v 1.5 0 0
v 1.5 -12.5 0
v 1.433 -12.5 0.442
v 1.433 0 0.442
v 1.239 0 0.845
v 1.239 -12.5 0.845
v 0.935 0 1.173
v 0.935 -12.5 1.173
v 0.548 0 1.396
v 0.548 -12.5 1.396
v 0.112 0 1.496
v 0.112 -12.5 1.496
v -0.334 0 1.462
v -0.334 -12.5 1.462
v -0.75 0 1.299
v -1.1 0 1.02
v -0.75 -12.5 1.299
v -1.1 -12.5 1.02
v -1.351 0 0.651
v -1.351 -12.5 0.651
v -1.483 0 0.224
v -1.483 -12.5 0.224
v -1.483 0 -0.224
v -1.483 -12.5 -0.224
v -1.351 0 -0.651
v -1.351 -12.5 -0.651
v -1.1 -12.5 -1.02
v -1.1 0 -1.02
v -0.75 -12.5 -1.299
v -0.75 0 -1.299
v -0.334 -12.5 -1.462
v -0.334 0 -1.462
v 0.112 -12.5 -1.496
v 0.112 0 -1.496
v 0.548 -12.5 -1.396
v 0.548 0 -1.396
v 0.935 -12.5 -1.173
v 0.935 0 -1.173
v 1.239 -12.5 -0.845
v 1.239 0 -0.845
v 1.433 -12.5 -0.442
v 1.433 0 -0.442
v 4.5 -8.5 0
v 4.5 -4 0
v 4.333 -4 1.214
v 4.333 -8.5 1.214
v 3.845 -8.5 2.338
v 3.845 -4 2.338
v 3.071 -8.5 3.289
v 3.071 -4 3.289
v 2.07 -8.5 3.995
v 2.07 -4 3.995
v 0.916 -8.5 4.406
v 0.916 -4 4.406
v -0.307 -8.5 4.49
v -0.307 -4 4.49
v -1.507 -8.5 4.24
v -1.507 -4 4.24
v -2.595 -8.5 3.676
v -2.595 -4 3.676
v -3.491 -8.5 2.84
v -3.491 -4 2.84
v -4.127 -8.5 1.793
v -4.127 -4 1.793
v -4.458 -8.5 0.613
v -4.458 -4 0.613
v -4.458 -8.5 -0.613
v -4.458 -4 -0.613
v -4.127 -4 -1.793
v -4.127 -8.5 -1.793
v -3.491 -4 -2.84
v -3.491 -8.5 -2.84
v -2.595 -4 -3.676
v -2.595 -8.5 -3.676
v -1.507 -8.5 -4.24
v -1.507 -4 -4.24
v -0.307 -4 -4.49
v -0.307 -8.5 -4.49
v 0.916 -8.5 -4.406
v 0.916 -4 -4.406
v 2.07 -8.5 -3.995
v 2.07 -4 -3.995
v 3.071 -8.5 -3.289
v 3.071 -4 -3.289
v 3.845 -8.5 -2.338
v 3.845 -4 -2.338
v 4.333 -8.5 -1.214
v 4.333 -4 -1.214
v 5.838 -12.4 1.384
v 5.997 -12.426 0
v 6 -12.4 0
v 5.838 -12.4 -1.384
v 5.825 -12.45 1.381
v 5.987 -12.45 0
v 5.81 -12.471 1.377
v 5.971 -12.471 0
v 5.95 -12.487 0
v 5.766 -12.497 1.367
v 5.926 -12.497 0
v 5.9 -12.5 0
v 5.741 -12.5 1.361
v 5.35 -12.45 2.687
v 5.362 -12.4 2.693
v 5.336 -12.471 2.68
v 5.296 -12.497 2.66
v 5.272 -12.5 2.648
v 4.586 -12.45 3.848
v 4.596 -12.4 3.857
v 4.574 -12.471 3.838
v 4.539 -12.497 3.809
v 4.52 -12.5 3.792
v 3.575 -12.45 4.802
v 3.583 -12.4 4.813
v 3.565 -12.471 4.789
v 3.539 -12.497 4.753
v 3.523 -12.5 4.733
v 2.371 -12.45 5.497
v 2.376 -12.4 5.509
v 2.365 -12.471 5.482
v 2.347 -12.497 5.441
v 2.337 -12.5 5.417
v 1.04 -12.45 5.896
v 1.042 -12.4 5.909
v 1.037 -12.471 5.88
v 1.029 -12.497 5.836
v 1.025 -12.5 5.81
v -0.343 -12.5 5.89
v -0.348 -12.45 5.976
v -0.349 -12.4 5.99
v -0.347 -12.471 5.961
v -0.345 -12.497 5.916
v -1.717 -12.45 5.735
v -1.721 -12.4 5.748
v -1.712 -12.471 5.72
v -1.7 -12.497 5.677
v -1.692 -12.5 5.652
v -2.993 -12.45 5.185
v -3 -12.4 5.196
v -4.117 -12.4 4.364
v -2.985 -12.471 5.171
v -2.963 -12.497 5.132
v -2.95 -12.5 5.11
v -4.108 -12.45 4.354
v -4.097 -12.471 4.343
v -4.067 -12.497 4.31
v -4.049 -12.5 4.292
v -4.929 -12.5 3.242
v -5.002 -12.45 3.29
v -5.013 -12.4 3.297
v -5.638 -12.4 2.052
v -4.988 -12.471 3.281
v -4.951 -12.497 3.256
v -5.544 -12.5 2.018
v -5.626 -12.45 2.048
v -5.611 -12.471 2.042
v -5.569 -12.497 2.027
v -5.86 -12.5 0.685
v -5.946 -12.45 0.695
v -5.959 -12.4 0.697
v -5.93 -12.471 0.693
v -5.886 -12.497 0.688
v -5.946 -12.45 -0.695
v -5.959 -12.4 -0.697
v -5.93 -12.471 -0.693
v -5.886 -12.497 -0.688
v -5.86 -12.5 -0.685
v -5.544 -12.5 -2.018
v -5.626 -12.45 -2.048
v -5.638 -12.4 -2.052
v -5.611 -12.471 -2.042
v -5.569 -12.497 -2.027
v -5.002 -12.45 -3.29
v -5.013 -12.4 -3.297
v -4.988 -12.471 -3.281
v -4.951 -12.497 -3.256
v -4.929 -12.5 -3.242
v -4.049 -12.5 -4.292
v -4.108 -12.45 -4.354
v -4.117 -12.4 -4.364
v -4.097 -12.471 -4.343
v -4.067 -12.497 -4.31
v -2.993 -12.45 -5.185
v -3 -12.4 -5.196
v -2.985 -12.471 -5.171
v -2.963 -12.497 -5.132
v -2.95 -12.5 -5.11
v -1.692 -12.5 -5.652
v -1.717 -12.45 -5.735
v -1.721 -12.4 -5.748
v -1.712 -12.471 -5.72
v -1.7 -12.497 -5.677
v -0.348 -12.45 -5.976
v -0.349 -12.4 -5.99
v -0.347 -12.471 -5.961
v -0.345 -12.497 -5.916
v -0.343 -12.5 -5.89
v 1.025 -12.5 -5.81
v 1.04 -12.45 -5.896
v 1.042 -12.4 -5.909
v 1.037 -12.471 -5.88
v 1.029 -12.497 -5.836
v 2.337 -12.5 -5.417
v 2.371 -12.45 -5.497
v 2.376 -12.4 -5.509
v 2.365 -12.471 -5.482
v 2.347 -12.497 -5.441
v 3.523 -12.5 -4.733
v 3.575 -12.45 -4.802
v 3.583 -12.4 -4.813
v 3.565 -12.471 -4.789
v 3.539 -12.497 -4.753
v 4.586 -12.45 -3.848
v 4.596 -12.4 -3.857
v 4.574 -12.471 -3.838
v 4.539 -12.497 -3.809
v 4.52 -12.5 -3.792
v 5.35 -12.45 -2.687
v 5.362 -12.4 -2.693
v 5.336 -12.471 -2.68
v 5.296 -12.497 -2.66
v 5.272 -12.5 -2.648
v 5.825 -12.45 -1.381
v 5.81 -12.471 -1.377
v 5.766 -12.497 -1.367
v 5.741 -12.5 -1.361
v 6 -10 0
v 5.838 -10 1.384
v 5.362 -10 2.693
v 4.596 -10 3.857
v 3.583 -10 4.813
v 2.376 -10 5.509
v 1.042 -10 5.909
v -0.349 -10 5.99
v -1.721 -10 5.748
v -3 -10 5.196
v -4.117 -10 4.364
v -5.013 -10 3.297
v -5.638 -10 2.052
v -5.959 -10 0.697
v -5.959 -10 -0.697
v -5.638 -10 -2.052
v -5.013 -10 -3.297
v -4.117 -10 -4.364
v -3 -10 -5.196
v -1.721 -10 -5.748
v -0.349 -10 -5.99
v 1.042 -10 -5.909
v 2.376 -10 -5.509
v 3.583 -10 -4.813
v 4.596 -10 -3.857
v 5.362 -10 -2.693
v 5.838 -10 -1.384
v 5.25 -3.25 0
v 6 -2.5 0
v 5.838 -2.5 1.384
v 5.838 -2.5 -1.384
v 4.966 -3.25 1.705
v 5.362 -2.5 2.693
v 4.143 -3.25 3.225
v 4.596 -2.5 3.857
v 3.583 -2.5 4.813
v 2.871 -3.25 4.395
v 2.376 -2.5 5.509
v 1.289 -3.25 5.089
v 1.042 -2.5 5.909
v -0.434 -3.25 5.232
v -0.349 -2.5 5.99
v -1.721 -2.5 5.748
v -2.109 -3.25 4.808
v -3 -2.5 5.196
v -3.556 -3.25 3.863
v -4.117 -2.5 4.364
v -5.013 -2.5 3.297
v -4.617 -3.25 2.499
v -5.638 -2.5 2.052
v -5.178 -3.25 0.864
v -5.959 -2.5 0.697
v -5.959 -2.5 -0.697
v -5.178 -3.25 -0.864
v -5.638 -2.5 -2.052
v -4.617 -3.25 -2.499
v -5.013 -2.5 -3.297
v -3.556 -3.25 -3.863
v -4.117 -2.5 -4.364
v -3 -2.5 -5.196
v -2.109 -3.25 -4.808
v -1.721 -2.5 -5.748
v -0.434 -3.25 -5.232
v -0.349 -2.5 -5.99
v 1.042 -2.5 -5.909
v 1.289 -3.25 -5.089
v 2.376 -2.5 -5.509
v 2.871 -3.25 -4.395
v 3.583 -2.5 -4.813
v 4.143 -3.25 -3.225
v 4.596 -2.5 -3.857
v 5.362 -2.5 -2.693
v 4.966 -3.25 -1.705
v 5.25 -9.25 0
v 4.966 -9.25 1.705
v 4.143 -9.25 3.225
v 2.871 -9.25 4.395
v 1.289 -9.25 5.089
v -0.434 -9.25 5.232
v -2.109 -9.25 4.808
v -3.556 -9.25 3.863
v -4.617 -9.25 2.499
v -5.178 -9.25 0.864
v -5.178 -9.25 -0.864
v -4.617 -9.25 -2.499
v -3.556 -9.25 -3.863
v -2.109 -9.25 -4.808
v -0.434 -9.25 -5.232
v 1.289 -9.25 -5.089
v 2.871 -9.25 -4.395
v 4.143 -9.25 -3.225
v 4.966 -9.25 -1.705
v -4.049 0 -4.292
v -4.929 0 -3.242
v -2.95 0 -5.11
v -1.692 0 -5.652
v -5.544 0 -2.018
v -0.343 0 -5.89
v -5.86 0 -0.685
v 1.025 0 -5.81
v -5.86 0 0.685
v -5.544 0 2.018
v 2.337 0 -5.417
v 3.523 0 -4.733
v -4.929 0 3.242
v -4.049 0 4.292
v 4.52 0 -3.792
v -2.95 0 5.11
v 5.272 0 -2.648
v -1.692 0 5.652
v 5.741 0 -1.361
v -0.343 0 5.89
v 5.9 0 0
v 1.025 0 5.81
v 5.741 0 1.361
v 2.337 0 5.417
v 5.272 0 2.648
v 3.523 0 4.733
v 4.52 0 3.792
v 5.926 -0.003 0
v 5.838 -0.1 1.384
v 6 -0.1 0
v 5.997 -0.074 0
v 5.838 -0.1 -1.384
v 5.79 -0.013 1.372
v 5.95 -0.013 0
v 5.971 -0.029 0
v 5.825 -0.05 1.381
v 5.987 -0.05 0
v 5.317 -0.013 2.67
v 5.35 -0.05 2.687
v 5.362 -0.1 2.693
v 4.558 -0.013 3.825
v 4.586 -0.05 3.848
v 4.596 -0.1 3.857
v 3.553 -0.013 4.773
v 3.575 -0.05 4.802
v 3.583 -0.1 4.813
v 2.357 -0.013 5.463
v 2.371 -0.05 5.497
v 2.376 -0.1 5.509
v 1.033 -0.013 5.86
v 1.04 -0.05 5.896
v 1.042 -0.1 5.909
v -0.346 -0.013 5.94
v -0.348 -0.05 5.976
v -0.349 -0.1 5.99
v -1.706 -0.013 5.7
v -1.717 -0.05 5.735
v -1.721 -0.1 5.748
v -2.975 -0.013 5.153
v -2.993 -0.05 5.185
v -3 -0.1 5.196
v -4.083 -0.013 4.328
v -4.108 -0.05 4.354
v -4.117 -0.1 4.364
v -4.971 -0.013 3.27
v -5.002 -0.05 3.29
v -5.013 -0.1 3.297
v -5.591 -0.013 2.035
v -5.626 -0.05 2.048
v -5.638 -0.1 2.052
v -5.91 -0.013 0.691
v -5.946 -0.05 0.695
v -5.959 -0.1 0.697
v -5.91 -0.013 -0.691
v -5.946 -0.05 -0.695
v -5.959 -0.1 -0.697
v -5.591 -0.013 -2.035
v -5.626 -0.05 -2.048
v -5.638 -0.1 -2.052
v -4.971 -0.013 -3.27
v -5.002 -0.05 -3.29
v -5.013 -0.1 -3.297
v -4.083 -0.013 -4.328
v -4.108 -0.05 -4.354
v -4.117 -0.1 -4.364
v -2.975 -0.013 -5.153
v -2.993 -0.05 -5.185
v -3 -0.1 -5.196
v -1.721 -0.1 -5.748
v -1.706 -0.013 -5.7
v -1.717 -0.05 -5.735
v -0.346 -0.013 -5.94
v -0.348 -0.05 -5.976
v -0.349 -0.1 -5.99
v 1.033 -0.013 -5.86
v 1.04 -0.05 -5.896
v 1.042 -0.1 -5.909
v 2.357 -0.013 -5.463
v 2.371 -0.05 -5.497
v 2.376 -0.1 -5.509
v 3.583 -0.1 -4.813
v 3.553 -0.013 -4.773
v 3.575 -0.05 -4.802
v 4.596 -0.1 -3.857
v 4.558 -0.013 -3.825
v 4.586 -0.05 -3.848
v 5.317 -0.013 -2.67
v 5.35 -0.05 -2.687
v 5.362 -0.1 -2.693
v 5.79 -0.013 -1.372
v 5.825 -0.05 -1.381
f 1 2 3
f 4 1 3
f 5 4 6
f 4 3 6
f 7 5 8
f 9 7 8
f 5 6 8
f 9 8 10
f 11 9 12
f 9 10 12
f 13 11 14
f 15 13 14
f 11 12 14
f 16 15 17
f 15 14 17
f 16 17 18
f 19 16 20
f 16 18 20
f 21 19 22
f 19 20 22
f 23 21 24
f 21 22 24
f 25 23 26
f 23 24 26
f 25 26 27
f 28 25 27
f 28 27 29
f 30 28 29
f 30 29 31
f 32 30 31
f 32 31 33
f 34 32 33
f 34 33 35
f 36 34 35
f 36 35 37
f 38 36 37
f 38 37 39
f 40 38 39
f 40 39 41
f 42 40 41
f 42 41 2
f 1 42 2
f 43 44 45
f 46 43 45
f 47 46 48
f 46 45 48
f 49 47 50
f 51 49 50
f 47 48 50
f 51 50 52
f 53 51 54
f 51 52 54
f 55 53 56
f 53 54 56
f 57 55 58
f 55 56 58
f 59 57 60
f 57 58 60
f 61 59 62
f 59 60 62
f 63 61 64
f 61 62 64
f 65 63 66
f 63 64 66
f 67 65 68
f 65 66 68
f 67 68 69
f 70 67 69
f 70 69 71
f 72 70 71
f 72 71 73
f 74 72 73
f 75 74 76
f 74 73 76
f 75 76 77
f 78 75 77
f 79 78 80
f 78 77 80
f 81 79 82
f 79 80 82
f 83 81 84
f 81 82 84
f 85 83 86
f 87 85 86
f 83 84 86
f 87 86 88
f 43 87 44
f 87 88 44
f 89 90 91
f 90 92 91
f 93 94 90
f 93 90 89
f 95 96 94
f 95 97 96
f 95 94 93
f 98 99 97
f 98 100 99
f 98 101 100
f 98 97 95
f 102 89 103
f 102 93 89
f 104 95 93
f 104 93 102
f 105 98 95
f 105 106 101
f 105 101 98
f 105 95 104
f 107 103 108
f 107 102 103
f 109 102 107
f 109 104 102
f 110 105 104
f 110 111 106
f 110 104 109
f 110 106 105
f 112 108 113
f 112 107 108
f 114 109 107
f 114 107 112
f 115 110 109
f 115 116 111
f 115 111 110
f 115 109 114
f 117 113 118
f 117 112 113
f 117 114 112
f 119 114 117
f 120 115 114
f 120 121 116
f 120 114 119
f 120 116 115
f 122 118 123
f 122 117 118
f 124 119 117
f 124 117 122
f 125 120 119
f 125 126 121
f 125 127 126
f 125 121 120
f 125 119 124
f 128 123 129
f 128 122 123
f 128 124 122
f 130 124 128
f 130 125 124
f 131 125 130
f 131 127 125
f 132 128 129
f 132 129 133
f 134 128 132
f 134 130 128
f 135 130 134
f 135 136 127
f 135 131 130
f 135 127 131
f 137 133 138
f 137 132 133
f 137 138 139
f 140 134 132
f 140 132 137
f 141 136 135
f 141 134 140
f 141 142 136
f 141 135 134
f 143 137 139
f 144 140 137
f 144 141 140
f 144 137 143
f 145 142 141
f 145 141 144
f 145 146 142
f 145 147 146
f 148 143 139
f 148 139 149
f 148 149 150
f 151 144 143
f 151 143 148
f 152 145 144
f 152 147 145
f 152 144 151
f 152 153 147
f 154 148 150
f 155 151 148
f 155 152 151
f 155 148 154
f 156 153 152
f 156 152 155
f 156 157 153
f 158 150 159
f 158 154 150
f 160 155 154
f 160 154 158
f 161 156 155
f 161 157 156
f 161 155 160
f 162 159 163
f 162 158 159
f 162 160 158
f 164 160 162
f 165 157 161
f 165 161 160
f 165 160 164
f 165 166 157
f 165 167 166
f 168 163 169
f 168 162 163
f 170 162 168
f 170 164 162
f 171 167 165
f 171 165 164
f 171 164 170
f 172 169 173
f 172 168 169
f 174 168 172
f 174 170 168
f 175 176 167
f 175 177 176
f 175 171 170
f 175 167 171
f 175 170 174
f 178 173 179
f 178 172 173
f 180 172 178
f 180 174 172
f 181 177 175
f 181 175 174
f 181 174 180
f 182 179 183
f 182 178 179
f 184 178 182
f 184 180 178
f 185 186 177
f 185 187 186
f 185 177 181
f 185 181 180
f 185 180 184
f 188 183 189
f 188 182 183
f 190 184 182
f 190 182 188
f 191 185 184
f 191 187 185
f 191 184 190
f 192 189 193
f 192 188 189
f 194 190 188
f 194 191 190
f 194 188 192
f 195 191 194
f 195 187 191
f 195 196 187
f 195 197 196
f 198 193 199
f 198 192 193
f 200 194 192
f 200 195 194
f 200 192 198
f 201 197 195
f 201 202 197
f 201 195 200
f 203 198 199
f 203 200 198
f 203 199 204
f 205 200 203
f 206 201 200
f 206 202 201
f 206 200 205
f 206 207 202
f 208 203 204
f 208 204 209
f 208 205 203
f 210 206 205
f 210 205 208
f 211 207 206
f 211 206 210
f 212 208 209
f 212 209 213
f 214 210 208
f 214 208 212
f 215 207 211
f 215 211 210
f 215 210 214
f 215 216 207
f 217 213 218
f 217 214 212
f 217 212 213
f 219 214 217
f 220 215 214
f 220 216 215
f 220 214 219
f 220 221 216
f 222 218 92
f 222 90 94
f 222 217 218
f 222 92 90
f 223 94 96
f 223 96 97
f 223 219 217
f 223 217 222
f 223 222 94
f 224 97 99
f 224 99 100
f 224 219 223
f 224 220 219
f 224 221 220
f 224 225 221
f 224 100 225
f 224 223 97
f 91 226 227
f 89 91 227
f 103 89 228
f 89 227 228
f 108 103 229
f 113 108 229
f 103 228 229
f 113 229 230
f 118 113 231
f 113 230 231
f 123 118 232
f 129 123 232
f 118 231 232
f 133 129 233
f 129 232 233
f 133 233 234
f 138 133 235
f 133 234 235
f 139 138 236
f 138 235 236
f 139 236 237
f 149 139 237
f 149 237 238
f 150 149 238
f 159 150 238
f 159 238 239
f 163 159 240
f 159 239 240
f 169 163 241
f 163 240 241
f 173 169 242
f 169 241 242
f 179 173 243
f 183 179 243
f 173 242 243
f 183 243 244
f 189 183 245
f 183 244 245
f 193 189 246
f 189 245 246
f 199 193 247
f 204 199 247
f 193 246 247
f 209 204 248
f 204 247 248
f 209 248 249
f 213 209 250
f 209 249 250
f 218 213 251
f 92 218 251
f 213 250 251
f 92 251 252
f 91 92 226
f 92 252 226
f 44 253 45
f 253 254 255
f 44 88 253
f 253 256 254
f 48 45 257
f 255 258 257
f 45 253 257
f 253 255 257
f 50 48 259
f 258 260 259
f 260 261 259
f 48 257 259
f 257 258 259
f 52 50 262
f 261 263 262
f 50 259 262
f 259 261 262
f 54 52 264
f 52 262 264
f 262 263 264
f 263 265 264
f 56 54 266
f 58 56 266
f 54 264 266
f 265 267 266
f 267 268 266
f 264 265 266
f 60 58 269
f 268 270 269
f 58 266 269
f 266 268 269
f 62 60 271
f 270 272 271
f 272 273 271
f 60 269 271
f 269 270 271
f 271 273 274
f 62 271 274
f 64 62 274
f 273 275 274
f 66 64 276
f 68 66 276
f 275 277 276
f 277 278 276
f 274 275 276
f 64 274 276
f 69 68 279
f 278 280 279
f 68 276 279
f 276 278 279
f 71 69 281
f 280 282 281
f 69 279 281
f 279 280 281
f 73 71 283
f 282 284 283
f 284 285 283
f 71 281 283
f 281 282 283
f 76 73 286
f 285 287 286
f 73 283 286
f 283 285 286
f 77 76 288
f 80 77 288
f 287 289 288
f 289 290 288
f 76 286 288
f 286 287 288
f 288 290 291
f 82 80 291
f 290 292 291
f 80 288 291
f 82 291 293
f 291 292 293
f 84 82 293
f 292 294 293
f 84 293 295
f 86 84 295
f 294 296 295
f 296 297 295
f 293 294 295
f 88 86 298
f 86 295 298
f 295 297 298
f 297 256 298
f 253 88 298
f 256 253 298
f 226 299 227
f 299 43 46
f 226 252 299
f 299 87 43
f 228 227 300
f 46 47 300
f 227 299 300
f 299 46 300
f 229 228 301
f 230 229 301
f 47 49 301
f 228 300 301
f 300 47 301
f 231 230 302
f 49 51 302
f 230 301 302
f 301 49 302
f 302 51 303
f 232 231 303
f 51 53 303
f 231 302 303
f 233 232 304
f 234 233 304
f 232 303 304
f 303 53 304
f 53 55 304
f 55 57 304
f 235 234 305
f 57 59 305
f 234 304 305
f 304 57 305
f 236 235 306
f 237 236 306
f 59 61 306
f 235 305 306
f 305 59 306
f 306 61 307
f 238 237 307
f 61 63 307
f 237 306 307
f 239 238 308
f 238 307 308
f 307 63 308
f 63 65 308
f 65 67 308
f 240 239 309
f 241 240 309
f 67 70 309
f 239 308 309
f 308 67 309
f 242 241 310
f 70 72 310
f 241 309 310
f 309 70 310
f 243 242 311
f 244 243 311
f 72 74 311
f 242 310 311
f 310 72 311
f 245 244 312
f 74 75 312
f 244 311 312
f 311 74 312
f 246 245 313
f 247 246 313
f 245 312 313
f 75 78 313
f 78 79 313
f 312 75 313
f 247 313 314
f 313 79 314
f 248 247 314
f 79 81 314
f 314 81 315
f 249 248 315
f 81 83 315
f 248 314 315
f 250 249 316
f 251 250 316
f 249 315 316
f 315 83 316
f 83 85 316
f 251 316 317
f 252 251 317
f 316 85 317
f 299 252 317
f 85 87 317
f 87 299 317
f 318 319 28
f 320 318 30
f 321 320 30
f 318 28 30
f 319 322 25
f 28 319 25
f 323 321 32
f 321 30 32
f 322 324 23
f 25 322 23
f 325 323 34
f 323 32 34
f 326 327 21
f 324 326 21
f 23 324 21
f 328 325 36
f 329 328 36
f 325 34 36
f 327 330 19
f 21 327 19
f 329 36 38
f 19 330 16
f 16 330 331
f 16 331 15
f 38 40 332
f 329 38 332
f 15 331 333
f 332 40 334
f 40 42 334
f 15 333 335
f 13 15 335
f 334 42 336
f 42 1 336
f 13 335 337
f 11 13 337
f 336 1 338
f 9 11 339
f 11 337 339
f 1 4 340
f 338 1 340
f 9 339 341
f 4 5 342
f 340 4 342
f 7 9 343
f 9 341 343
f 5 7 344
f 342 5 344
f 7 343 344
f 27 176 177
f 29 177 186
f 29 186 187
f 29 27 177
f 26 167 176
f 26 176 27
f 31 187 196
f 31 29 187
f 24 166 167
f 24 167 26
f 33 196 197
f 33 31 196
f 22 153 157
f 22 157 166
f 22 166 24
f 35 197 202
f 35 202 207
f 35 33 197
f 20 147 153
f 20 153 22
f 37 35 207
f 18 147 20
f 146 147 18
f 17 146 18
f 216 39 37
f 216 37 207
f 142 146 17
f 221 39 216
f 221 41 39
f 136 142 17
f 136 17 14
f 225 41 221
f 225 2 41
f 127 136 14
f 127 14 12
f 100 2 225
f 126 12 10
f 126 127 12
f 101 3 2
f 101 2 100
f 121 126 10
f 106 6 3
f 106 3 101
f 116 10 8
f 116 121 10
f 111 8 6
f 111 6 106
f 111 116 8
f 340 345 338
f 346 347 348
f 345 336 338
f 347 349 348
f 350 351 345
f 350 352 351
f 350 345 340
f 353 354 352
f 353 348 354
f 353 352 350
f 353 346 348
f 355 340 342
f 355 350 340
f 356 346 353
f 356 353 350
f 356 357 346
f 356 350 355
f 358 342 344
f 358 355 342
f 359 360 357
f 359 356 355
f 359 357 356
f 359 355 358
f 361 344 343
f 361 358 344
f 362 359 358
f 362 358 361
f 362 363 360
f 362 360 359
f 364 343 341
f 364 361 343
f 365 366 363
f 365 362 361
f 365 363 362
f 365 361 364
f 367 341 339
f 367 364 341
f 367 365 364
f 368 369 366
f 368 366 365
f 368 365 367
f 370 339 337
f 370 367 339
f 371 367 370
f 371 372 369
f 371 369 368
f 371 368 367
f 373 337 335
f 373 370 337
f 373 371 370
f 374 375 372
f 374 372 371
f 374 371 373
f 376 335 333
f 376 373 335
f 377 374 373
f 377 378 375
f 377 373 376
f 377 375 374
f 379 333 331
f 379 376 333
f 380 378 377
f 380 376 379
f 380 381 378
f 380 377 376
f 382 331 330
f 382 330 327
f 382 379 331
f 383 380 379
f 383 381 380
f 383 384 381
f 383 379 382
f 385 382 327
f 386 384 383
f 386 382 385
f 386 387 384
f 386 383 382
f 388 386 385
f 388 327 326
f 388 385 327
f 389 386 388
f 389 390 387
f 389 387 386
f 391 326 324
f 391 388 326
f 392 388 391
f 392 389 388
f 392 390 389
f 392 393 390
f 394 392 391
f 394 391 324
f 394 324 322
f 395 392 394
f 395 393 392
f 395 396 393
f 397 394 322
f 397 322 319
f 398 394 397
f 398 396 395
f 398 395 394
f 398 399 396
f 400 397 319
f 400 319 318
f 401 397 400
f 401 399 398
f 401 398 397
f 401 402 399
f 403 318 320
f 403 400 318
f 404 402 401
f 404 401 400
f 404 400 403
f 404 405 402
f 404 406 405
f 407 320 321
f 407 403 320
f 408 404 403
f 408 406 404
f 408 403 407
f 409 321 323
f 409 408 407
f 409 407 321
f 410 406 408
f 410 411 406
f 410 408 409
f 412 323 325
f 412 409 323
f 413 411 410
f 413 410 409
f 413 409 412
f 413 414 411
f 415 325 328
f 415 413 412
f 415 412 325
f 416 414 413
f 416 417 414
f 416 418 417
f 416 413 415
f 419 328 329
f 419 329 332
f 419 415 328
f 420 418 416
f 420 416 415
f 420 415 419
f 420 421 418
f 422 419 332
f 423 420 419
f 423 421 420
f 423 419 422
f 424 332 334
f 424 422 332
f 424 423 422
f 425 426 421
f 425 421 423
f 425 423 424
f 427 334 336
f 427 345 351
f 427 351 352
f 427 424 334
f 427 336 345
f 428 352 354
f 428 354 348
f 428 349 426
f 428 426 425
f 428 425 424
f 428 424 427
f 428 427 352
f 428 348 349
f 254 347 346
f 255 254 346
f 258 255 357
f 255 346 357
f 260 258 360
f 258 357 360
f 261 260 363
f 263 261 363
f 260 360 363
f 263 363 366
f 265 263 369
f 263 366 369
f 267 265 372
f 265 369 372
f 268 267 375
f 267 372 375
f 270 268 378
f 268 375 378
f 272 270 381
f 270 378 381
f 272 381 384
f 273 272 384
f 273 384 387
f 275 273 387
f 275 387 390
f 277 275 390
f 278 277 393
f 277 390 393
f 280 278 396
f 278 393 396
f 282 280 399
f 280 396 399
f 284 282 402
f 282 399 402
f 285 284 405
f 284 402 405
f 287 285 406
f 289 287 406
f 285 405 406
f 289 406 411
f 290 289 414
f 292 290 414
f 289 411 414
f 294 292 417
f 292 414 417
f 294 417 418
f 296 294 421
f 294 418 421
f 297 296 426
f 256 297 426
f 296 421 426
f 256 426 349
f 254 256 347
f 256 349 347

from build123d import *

# Parameters (mm, degrees)
F0_R     = 6
F1_DEPTH = 4
F2_R     = 4.5
F3_DEPTH = 4.5
F4_R     = 6
F4_R_2   = 4.5
F5_DEPTH = 4
F6_R     = 1.5
F7_DEPTH = 15
F8_SIZE  = 1.49999
F9_R     = 0.1


# Not quite as in the source:
# - a fillet or chamfer is up to 0.001 mm smaller than in the source, because OpenCascade refuses the exact size


with BuildPart() as f1:
    # F0 (on Front) → F1 (new body)
    with BuildSketch(Plane.XZ):
        Circle(F0_R)
    extrude(amount=F1_DEPTH)

    # F2 (on face) → F3 (join)
    with BuildSketch(Plane.XZ.offset(4)):
        Circle(F2_R)
    extrude(amount=F3_DEPTH)

    # F4 (on face) → F5 (join)
    with BuildSketch(Plane.XZ.offset(8.5)):
        Circle(F4_R)
        Circle(F4_R_2, mode=Mode.SUBTRACT)
        Circle(F4_R_2)
    extrude(amount=F5_DEPTH)

    # F6 (on face) → F7 (cut)
    with BuildSketch(Plane.XZ.offset(12.5)):
        Circle(F6_R)
    extrude(amount=-F7_DEPTH, mode=Mode.SUBTRACT)

    # F8 (size 1.5 in the source; OpenCascade refuses exactly that, so slightly less here)
    f8_edges = [f1.edges().sort_by_distance(p)[0] for p in [
        (-6, -8.5, 0),
        (-6, -4, 0),
    ]]
    chamfer(f8_edges, length=F8_SIZE)

    # F9
    f9_edges = [f1.edges().sort_by_distance(p)[0] for p in [
        (-6, -12.5, 0),
        (-6, 0, 0),
    ]]
    fillet(f9_edges, radius=F9_R)


solid = f1.part
